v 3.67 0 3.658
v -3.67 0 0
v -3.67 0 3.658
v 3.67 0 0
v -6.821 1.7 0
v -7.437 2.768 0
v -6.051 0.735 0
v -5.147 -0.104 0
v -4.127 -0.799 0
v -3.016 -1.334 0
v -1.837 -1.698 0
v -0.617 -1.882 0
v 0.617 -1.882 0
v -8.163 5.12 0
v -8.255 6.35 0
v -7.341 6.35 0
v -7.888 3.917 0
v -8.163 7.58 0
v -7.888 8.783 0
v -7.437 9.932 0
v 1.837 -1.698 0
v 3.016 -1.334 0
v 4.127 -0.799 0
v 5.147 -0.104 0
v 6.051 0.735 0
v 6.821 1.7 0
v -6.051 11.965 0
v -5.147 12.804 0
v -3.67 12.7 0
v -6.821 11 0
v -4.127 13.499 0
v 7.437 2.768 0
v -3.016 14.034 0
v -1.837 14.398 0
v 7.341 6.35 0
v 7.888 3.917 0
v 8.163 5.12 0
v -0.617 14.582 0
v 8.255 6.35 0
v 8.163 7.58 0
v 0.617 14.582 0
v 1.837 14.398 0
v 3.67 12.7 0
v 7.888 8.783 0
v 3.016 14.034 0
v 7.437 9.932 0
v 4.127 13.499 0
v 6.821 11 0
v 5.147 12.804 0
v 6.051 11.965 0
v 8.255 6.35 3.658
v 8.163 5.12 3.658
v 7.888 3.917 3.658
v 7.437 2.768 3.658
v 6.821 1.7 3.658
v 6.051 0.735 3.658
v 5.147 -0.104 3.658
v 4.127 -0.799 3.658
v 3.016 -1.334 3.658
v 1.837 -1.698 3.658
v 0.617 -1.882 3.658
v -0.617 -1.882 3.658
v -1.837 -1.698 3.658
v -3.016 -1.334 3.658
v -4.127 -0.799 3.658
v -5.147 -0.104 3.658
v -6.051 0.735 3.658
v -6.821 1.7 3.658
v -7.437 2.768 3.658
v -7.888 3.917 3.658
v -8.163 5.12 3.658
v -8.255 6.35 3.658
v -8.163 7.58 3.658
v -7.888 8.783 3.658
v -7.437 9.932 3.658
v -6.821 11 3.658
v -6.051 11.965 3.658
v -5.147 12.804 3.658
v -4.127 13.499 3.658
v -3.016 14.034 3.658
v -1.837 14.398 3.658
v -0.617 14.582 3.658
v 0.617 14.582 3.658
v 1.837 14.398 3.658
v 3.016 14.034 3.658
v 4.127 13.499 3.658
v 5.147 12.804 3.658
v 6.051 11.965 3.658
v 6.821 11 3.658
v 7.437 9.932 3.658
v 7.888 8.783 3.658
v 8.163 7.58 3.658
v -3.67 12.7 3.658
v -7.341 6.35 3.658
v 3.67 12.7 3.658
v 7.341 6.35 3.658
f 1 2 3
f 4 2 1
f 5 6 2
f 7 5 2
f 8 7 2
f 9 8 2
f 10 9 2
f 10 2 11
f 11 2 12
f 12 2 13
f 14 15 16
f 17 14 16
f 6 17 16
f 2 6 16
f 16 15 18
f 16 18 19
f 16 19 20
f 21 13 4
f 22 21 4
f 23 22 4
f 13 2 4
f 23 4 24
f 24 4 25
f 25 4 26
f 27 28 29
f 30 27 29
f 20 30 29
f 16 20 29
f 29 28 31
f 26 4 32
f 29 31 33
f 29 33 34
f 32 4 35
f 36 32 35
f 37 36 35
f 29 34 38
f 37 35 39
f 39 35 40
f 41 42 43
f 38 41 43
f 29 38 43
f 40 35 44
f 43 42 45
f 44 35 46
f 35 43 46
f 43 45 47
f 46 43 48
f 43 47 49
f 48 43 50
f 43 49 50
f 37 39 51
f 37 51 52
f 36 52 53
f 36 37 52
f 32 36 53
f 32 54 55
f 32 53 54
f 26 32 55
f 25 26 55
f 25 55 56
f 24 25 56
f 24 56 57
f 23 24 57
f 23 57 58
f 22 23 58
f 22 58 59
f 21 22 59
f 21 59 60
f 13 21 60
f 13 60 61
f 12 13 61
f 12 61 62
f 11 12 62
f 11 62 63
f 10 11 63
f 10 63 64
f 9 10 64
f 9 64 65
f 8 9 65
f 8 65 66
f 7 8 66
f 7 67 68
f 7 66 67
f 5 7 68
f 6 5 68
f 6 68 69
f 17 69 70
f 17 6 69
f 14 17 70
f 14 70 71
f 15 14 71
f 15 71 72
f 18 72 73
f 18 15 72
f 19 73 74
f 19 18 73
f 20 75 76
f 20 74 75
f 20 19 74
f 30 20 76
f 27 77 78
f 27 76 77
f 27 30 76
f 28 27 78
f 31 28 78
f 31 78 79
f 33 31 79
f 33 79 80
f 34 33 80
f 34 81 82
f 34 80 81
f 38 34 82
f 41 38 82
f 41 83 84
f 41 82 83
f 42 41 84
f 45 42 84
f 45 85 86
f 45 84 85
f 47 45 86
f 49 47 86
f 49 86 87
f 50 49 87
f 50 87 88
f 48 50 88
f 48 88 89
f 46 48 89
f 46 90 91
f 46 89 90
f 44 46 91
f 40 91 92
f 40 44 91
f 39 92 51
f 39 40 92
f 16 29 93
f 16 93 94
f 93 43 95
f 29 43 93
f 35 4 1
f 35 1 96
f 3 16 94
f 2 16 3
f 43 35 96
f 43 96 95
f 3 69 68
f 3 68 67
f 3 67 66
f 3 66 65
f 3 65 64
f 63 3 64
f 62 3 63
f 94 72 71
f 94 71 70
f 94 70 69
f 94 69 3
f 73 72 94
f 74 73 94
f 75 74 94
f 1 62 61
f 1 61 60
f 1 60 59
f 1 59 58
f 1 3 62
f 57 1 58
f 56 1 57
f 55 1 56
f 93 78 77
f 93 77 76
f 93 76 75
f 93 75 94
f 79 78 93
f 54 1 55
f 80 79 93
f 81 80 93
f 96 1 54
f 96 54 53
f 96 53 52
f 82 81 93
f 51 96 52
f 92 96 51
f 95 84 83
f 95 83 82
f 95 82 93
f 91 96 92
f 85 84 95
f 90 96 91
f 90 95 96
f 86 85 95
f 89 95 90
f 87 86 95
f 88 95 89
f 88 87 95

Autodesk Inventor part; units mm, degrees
ref_plane "YZ Plane" through (0, 0, 0) normal (1, 0, 0) x (0, 1, 0)
ref_plane "XZ Plane" through (0, 0, 0) normal (0, 1, 0) x (-1, 0, 0)
ref_plane "XY Plane" through (0, 0, 0) normal (0, 0, 1) x (1, 0, 0)
sketch "Sketch2" plane through (0, 0, 0) normal (0, 0, 1) x (1, 0, 0)
  line L0 (0, 12.7) -> (3.6703, 12.7)
  line L1 (0, 12.7) -> (-3.6703, 12.7)
  line L2 (0, 0) -> (3.6703, 0)
  line L3 (0, 0) -> (-3.6703, 0)
  line L4 (-3.6703, 0) -> (-7.3406, 6.35)
  line L5 (-7.3406, 6.35) -> (-3.6703, 12.7)
  line L6 (3.6703, 12.7) -> (7.3406, 6.35)
  line L7 (7.3406, 6.35) -> (3.6703, 0)
  line L8 (0, 0) -> (0, 6.35)
  circle A0 centre (0, 6.35) radius 8.255
  dimension "d11" = 6.35
  dimension "d12" = 16.51
extrude "Extrusion2" add sketch "Sketch2" along normal blind 6.223
sketch "Sketch3" plane through (0, 6.35, 6.223) normal (0, 0, 1) x (1, 0, 0)
  line L0 (-3.6703, -6.35) -> (-7.3406, 0) projected
  line L1 (-7.3406, 0) -> (-3.6703, 6.35) projected
  line L2 (-3.6703, 6.35) -> (3.6703, 6.35) projected
  line L3 (3.6703, 6.35) -> (7.3406, 0) projected
  line L4 (7.3406, 0) -> (3.6703, -6.35) projected
  line L5 (3.6703, -6.35) -> (-3.6703, -6.35) projected
  circle A0 centre (0, 0) radius 8.255 projected
  point P0 (0, -6.35)
extrude "Extrusion3" add sketch "Sketch3" along normal blind 3.302
sketch "Sketch4" plane through (0, 6.35, 9.525) normal (0, 0, 1) x (1, 0, 0)
  line L0 (-7.3406, 0) -> (-3.6703, 6.35) projected
  line L1 (-3.6703, 6.35) -> (3.6703, 6.35) projected
  line L2 (3.6703, 6.35) -> (7.3406, 0) projected
  line L3 (7.3406, 0) -> (3.6703, -6.35) projected
  line L4 (3.6703, -6.35) -> (-3.6703, -6.35) projected
  line L5 (-3.6703, -6.35) -> (-7.3406, 0) projected
  circle A0 centre (0, 0) radius 8.255 projected
  point P0 (0, -6.35)
extrude "Extrusion4" add sketch "Sketch4" along normal blind 6.5786
sketch "Sketch5" plane through (0, 6.35, 16.1036) normal (0, 0, 1) x (1, 0, 0)
  line L0 (-16.3467, 15.7745) -> (15.1254, 15.7745)
  line L1 (15.1254, 15.7745) -> (15.1254, -12.8793)
  line L2 (15.1254, -12.8793) -> (-16.3467, -12.8793)
  line L3 (-16.3467, -12.8793) -> (-16.3467, 15.7745)
  point P0 (0, -6.35)
extrude "Extrusion5" cut sketch "Sketch5" against normal blind 6.5786
sketch "Sketch8" plane through (0, 6.35, 9.525) normal (0, 0, 1) x (1, 0, 0)
  line L0 (-7.3406, 0) -> (-3.6703, -6.35) projected
  line L1 (-3.6703, 6.35) -> (-7.3406, 0) projected
  line L2 (3.6703, 6.35) -> (-3.6703, 6.35) projected
  line L3 (7.3406, 0) -> (3.6703, 6.35) projected
  line L4 (3.6703, -6.35) -> (7.3406, 0) projected
  line L5 (-3.6703, -6.35) -> (3.6703, -6.35) projected
  circle A0 centre (0, 0) radius 8.255 projected
  point P0 (0, -6.35)
extrude "Extrusion7" add sketch "Sketch8" along normal blind 15.875
sketch "Sketch9" plane through (0, 6.35, 25.4) normal (0, 0, 1) x (1, 0, 0)
  line L0 (-7.3406, 0) -> (-3.6703, 6.35) projected
  line L1 (-3.6703, 6.35) -> (3.6703, 6.35) projected
  line L2 (3.6703, 6.35) -> (7.3406, 0) projected
  line L3 (7.3406, 0) -> (3.6703, -6.35) projected
  line L4 (3.6703, -6.35) -> (-3.6703, -6.35) projected
  line L5 (-3.6703, -6.35) -> (-7.3406, 0) projected
  circle A0 centre (0, 0) radius 8.255 projected
  point P0 (0, -6.35)
extrude "Extrusion8" cut sketch "Sketch9" against normal blind 21.7424
properties part number ".144Spacer"
